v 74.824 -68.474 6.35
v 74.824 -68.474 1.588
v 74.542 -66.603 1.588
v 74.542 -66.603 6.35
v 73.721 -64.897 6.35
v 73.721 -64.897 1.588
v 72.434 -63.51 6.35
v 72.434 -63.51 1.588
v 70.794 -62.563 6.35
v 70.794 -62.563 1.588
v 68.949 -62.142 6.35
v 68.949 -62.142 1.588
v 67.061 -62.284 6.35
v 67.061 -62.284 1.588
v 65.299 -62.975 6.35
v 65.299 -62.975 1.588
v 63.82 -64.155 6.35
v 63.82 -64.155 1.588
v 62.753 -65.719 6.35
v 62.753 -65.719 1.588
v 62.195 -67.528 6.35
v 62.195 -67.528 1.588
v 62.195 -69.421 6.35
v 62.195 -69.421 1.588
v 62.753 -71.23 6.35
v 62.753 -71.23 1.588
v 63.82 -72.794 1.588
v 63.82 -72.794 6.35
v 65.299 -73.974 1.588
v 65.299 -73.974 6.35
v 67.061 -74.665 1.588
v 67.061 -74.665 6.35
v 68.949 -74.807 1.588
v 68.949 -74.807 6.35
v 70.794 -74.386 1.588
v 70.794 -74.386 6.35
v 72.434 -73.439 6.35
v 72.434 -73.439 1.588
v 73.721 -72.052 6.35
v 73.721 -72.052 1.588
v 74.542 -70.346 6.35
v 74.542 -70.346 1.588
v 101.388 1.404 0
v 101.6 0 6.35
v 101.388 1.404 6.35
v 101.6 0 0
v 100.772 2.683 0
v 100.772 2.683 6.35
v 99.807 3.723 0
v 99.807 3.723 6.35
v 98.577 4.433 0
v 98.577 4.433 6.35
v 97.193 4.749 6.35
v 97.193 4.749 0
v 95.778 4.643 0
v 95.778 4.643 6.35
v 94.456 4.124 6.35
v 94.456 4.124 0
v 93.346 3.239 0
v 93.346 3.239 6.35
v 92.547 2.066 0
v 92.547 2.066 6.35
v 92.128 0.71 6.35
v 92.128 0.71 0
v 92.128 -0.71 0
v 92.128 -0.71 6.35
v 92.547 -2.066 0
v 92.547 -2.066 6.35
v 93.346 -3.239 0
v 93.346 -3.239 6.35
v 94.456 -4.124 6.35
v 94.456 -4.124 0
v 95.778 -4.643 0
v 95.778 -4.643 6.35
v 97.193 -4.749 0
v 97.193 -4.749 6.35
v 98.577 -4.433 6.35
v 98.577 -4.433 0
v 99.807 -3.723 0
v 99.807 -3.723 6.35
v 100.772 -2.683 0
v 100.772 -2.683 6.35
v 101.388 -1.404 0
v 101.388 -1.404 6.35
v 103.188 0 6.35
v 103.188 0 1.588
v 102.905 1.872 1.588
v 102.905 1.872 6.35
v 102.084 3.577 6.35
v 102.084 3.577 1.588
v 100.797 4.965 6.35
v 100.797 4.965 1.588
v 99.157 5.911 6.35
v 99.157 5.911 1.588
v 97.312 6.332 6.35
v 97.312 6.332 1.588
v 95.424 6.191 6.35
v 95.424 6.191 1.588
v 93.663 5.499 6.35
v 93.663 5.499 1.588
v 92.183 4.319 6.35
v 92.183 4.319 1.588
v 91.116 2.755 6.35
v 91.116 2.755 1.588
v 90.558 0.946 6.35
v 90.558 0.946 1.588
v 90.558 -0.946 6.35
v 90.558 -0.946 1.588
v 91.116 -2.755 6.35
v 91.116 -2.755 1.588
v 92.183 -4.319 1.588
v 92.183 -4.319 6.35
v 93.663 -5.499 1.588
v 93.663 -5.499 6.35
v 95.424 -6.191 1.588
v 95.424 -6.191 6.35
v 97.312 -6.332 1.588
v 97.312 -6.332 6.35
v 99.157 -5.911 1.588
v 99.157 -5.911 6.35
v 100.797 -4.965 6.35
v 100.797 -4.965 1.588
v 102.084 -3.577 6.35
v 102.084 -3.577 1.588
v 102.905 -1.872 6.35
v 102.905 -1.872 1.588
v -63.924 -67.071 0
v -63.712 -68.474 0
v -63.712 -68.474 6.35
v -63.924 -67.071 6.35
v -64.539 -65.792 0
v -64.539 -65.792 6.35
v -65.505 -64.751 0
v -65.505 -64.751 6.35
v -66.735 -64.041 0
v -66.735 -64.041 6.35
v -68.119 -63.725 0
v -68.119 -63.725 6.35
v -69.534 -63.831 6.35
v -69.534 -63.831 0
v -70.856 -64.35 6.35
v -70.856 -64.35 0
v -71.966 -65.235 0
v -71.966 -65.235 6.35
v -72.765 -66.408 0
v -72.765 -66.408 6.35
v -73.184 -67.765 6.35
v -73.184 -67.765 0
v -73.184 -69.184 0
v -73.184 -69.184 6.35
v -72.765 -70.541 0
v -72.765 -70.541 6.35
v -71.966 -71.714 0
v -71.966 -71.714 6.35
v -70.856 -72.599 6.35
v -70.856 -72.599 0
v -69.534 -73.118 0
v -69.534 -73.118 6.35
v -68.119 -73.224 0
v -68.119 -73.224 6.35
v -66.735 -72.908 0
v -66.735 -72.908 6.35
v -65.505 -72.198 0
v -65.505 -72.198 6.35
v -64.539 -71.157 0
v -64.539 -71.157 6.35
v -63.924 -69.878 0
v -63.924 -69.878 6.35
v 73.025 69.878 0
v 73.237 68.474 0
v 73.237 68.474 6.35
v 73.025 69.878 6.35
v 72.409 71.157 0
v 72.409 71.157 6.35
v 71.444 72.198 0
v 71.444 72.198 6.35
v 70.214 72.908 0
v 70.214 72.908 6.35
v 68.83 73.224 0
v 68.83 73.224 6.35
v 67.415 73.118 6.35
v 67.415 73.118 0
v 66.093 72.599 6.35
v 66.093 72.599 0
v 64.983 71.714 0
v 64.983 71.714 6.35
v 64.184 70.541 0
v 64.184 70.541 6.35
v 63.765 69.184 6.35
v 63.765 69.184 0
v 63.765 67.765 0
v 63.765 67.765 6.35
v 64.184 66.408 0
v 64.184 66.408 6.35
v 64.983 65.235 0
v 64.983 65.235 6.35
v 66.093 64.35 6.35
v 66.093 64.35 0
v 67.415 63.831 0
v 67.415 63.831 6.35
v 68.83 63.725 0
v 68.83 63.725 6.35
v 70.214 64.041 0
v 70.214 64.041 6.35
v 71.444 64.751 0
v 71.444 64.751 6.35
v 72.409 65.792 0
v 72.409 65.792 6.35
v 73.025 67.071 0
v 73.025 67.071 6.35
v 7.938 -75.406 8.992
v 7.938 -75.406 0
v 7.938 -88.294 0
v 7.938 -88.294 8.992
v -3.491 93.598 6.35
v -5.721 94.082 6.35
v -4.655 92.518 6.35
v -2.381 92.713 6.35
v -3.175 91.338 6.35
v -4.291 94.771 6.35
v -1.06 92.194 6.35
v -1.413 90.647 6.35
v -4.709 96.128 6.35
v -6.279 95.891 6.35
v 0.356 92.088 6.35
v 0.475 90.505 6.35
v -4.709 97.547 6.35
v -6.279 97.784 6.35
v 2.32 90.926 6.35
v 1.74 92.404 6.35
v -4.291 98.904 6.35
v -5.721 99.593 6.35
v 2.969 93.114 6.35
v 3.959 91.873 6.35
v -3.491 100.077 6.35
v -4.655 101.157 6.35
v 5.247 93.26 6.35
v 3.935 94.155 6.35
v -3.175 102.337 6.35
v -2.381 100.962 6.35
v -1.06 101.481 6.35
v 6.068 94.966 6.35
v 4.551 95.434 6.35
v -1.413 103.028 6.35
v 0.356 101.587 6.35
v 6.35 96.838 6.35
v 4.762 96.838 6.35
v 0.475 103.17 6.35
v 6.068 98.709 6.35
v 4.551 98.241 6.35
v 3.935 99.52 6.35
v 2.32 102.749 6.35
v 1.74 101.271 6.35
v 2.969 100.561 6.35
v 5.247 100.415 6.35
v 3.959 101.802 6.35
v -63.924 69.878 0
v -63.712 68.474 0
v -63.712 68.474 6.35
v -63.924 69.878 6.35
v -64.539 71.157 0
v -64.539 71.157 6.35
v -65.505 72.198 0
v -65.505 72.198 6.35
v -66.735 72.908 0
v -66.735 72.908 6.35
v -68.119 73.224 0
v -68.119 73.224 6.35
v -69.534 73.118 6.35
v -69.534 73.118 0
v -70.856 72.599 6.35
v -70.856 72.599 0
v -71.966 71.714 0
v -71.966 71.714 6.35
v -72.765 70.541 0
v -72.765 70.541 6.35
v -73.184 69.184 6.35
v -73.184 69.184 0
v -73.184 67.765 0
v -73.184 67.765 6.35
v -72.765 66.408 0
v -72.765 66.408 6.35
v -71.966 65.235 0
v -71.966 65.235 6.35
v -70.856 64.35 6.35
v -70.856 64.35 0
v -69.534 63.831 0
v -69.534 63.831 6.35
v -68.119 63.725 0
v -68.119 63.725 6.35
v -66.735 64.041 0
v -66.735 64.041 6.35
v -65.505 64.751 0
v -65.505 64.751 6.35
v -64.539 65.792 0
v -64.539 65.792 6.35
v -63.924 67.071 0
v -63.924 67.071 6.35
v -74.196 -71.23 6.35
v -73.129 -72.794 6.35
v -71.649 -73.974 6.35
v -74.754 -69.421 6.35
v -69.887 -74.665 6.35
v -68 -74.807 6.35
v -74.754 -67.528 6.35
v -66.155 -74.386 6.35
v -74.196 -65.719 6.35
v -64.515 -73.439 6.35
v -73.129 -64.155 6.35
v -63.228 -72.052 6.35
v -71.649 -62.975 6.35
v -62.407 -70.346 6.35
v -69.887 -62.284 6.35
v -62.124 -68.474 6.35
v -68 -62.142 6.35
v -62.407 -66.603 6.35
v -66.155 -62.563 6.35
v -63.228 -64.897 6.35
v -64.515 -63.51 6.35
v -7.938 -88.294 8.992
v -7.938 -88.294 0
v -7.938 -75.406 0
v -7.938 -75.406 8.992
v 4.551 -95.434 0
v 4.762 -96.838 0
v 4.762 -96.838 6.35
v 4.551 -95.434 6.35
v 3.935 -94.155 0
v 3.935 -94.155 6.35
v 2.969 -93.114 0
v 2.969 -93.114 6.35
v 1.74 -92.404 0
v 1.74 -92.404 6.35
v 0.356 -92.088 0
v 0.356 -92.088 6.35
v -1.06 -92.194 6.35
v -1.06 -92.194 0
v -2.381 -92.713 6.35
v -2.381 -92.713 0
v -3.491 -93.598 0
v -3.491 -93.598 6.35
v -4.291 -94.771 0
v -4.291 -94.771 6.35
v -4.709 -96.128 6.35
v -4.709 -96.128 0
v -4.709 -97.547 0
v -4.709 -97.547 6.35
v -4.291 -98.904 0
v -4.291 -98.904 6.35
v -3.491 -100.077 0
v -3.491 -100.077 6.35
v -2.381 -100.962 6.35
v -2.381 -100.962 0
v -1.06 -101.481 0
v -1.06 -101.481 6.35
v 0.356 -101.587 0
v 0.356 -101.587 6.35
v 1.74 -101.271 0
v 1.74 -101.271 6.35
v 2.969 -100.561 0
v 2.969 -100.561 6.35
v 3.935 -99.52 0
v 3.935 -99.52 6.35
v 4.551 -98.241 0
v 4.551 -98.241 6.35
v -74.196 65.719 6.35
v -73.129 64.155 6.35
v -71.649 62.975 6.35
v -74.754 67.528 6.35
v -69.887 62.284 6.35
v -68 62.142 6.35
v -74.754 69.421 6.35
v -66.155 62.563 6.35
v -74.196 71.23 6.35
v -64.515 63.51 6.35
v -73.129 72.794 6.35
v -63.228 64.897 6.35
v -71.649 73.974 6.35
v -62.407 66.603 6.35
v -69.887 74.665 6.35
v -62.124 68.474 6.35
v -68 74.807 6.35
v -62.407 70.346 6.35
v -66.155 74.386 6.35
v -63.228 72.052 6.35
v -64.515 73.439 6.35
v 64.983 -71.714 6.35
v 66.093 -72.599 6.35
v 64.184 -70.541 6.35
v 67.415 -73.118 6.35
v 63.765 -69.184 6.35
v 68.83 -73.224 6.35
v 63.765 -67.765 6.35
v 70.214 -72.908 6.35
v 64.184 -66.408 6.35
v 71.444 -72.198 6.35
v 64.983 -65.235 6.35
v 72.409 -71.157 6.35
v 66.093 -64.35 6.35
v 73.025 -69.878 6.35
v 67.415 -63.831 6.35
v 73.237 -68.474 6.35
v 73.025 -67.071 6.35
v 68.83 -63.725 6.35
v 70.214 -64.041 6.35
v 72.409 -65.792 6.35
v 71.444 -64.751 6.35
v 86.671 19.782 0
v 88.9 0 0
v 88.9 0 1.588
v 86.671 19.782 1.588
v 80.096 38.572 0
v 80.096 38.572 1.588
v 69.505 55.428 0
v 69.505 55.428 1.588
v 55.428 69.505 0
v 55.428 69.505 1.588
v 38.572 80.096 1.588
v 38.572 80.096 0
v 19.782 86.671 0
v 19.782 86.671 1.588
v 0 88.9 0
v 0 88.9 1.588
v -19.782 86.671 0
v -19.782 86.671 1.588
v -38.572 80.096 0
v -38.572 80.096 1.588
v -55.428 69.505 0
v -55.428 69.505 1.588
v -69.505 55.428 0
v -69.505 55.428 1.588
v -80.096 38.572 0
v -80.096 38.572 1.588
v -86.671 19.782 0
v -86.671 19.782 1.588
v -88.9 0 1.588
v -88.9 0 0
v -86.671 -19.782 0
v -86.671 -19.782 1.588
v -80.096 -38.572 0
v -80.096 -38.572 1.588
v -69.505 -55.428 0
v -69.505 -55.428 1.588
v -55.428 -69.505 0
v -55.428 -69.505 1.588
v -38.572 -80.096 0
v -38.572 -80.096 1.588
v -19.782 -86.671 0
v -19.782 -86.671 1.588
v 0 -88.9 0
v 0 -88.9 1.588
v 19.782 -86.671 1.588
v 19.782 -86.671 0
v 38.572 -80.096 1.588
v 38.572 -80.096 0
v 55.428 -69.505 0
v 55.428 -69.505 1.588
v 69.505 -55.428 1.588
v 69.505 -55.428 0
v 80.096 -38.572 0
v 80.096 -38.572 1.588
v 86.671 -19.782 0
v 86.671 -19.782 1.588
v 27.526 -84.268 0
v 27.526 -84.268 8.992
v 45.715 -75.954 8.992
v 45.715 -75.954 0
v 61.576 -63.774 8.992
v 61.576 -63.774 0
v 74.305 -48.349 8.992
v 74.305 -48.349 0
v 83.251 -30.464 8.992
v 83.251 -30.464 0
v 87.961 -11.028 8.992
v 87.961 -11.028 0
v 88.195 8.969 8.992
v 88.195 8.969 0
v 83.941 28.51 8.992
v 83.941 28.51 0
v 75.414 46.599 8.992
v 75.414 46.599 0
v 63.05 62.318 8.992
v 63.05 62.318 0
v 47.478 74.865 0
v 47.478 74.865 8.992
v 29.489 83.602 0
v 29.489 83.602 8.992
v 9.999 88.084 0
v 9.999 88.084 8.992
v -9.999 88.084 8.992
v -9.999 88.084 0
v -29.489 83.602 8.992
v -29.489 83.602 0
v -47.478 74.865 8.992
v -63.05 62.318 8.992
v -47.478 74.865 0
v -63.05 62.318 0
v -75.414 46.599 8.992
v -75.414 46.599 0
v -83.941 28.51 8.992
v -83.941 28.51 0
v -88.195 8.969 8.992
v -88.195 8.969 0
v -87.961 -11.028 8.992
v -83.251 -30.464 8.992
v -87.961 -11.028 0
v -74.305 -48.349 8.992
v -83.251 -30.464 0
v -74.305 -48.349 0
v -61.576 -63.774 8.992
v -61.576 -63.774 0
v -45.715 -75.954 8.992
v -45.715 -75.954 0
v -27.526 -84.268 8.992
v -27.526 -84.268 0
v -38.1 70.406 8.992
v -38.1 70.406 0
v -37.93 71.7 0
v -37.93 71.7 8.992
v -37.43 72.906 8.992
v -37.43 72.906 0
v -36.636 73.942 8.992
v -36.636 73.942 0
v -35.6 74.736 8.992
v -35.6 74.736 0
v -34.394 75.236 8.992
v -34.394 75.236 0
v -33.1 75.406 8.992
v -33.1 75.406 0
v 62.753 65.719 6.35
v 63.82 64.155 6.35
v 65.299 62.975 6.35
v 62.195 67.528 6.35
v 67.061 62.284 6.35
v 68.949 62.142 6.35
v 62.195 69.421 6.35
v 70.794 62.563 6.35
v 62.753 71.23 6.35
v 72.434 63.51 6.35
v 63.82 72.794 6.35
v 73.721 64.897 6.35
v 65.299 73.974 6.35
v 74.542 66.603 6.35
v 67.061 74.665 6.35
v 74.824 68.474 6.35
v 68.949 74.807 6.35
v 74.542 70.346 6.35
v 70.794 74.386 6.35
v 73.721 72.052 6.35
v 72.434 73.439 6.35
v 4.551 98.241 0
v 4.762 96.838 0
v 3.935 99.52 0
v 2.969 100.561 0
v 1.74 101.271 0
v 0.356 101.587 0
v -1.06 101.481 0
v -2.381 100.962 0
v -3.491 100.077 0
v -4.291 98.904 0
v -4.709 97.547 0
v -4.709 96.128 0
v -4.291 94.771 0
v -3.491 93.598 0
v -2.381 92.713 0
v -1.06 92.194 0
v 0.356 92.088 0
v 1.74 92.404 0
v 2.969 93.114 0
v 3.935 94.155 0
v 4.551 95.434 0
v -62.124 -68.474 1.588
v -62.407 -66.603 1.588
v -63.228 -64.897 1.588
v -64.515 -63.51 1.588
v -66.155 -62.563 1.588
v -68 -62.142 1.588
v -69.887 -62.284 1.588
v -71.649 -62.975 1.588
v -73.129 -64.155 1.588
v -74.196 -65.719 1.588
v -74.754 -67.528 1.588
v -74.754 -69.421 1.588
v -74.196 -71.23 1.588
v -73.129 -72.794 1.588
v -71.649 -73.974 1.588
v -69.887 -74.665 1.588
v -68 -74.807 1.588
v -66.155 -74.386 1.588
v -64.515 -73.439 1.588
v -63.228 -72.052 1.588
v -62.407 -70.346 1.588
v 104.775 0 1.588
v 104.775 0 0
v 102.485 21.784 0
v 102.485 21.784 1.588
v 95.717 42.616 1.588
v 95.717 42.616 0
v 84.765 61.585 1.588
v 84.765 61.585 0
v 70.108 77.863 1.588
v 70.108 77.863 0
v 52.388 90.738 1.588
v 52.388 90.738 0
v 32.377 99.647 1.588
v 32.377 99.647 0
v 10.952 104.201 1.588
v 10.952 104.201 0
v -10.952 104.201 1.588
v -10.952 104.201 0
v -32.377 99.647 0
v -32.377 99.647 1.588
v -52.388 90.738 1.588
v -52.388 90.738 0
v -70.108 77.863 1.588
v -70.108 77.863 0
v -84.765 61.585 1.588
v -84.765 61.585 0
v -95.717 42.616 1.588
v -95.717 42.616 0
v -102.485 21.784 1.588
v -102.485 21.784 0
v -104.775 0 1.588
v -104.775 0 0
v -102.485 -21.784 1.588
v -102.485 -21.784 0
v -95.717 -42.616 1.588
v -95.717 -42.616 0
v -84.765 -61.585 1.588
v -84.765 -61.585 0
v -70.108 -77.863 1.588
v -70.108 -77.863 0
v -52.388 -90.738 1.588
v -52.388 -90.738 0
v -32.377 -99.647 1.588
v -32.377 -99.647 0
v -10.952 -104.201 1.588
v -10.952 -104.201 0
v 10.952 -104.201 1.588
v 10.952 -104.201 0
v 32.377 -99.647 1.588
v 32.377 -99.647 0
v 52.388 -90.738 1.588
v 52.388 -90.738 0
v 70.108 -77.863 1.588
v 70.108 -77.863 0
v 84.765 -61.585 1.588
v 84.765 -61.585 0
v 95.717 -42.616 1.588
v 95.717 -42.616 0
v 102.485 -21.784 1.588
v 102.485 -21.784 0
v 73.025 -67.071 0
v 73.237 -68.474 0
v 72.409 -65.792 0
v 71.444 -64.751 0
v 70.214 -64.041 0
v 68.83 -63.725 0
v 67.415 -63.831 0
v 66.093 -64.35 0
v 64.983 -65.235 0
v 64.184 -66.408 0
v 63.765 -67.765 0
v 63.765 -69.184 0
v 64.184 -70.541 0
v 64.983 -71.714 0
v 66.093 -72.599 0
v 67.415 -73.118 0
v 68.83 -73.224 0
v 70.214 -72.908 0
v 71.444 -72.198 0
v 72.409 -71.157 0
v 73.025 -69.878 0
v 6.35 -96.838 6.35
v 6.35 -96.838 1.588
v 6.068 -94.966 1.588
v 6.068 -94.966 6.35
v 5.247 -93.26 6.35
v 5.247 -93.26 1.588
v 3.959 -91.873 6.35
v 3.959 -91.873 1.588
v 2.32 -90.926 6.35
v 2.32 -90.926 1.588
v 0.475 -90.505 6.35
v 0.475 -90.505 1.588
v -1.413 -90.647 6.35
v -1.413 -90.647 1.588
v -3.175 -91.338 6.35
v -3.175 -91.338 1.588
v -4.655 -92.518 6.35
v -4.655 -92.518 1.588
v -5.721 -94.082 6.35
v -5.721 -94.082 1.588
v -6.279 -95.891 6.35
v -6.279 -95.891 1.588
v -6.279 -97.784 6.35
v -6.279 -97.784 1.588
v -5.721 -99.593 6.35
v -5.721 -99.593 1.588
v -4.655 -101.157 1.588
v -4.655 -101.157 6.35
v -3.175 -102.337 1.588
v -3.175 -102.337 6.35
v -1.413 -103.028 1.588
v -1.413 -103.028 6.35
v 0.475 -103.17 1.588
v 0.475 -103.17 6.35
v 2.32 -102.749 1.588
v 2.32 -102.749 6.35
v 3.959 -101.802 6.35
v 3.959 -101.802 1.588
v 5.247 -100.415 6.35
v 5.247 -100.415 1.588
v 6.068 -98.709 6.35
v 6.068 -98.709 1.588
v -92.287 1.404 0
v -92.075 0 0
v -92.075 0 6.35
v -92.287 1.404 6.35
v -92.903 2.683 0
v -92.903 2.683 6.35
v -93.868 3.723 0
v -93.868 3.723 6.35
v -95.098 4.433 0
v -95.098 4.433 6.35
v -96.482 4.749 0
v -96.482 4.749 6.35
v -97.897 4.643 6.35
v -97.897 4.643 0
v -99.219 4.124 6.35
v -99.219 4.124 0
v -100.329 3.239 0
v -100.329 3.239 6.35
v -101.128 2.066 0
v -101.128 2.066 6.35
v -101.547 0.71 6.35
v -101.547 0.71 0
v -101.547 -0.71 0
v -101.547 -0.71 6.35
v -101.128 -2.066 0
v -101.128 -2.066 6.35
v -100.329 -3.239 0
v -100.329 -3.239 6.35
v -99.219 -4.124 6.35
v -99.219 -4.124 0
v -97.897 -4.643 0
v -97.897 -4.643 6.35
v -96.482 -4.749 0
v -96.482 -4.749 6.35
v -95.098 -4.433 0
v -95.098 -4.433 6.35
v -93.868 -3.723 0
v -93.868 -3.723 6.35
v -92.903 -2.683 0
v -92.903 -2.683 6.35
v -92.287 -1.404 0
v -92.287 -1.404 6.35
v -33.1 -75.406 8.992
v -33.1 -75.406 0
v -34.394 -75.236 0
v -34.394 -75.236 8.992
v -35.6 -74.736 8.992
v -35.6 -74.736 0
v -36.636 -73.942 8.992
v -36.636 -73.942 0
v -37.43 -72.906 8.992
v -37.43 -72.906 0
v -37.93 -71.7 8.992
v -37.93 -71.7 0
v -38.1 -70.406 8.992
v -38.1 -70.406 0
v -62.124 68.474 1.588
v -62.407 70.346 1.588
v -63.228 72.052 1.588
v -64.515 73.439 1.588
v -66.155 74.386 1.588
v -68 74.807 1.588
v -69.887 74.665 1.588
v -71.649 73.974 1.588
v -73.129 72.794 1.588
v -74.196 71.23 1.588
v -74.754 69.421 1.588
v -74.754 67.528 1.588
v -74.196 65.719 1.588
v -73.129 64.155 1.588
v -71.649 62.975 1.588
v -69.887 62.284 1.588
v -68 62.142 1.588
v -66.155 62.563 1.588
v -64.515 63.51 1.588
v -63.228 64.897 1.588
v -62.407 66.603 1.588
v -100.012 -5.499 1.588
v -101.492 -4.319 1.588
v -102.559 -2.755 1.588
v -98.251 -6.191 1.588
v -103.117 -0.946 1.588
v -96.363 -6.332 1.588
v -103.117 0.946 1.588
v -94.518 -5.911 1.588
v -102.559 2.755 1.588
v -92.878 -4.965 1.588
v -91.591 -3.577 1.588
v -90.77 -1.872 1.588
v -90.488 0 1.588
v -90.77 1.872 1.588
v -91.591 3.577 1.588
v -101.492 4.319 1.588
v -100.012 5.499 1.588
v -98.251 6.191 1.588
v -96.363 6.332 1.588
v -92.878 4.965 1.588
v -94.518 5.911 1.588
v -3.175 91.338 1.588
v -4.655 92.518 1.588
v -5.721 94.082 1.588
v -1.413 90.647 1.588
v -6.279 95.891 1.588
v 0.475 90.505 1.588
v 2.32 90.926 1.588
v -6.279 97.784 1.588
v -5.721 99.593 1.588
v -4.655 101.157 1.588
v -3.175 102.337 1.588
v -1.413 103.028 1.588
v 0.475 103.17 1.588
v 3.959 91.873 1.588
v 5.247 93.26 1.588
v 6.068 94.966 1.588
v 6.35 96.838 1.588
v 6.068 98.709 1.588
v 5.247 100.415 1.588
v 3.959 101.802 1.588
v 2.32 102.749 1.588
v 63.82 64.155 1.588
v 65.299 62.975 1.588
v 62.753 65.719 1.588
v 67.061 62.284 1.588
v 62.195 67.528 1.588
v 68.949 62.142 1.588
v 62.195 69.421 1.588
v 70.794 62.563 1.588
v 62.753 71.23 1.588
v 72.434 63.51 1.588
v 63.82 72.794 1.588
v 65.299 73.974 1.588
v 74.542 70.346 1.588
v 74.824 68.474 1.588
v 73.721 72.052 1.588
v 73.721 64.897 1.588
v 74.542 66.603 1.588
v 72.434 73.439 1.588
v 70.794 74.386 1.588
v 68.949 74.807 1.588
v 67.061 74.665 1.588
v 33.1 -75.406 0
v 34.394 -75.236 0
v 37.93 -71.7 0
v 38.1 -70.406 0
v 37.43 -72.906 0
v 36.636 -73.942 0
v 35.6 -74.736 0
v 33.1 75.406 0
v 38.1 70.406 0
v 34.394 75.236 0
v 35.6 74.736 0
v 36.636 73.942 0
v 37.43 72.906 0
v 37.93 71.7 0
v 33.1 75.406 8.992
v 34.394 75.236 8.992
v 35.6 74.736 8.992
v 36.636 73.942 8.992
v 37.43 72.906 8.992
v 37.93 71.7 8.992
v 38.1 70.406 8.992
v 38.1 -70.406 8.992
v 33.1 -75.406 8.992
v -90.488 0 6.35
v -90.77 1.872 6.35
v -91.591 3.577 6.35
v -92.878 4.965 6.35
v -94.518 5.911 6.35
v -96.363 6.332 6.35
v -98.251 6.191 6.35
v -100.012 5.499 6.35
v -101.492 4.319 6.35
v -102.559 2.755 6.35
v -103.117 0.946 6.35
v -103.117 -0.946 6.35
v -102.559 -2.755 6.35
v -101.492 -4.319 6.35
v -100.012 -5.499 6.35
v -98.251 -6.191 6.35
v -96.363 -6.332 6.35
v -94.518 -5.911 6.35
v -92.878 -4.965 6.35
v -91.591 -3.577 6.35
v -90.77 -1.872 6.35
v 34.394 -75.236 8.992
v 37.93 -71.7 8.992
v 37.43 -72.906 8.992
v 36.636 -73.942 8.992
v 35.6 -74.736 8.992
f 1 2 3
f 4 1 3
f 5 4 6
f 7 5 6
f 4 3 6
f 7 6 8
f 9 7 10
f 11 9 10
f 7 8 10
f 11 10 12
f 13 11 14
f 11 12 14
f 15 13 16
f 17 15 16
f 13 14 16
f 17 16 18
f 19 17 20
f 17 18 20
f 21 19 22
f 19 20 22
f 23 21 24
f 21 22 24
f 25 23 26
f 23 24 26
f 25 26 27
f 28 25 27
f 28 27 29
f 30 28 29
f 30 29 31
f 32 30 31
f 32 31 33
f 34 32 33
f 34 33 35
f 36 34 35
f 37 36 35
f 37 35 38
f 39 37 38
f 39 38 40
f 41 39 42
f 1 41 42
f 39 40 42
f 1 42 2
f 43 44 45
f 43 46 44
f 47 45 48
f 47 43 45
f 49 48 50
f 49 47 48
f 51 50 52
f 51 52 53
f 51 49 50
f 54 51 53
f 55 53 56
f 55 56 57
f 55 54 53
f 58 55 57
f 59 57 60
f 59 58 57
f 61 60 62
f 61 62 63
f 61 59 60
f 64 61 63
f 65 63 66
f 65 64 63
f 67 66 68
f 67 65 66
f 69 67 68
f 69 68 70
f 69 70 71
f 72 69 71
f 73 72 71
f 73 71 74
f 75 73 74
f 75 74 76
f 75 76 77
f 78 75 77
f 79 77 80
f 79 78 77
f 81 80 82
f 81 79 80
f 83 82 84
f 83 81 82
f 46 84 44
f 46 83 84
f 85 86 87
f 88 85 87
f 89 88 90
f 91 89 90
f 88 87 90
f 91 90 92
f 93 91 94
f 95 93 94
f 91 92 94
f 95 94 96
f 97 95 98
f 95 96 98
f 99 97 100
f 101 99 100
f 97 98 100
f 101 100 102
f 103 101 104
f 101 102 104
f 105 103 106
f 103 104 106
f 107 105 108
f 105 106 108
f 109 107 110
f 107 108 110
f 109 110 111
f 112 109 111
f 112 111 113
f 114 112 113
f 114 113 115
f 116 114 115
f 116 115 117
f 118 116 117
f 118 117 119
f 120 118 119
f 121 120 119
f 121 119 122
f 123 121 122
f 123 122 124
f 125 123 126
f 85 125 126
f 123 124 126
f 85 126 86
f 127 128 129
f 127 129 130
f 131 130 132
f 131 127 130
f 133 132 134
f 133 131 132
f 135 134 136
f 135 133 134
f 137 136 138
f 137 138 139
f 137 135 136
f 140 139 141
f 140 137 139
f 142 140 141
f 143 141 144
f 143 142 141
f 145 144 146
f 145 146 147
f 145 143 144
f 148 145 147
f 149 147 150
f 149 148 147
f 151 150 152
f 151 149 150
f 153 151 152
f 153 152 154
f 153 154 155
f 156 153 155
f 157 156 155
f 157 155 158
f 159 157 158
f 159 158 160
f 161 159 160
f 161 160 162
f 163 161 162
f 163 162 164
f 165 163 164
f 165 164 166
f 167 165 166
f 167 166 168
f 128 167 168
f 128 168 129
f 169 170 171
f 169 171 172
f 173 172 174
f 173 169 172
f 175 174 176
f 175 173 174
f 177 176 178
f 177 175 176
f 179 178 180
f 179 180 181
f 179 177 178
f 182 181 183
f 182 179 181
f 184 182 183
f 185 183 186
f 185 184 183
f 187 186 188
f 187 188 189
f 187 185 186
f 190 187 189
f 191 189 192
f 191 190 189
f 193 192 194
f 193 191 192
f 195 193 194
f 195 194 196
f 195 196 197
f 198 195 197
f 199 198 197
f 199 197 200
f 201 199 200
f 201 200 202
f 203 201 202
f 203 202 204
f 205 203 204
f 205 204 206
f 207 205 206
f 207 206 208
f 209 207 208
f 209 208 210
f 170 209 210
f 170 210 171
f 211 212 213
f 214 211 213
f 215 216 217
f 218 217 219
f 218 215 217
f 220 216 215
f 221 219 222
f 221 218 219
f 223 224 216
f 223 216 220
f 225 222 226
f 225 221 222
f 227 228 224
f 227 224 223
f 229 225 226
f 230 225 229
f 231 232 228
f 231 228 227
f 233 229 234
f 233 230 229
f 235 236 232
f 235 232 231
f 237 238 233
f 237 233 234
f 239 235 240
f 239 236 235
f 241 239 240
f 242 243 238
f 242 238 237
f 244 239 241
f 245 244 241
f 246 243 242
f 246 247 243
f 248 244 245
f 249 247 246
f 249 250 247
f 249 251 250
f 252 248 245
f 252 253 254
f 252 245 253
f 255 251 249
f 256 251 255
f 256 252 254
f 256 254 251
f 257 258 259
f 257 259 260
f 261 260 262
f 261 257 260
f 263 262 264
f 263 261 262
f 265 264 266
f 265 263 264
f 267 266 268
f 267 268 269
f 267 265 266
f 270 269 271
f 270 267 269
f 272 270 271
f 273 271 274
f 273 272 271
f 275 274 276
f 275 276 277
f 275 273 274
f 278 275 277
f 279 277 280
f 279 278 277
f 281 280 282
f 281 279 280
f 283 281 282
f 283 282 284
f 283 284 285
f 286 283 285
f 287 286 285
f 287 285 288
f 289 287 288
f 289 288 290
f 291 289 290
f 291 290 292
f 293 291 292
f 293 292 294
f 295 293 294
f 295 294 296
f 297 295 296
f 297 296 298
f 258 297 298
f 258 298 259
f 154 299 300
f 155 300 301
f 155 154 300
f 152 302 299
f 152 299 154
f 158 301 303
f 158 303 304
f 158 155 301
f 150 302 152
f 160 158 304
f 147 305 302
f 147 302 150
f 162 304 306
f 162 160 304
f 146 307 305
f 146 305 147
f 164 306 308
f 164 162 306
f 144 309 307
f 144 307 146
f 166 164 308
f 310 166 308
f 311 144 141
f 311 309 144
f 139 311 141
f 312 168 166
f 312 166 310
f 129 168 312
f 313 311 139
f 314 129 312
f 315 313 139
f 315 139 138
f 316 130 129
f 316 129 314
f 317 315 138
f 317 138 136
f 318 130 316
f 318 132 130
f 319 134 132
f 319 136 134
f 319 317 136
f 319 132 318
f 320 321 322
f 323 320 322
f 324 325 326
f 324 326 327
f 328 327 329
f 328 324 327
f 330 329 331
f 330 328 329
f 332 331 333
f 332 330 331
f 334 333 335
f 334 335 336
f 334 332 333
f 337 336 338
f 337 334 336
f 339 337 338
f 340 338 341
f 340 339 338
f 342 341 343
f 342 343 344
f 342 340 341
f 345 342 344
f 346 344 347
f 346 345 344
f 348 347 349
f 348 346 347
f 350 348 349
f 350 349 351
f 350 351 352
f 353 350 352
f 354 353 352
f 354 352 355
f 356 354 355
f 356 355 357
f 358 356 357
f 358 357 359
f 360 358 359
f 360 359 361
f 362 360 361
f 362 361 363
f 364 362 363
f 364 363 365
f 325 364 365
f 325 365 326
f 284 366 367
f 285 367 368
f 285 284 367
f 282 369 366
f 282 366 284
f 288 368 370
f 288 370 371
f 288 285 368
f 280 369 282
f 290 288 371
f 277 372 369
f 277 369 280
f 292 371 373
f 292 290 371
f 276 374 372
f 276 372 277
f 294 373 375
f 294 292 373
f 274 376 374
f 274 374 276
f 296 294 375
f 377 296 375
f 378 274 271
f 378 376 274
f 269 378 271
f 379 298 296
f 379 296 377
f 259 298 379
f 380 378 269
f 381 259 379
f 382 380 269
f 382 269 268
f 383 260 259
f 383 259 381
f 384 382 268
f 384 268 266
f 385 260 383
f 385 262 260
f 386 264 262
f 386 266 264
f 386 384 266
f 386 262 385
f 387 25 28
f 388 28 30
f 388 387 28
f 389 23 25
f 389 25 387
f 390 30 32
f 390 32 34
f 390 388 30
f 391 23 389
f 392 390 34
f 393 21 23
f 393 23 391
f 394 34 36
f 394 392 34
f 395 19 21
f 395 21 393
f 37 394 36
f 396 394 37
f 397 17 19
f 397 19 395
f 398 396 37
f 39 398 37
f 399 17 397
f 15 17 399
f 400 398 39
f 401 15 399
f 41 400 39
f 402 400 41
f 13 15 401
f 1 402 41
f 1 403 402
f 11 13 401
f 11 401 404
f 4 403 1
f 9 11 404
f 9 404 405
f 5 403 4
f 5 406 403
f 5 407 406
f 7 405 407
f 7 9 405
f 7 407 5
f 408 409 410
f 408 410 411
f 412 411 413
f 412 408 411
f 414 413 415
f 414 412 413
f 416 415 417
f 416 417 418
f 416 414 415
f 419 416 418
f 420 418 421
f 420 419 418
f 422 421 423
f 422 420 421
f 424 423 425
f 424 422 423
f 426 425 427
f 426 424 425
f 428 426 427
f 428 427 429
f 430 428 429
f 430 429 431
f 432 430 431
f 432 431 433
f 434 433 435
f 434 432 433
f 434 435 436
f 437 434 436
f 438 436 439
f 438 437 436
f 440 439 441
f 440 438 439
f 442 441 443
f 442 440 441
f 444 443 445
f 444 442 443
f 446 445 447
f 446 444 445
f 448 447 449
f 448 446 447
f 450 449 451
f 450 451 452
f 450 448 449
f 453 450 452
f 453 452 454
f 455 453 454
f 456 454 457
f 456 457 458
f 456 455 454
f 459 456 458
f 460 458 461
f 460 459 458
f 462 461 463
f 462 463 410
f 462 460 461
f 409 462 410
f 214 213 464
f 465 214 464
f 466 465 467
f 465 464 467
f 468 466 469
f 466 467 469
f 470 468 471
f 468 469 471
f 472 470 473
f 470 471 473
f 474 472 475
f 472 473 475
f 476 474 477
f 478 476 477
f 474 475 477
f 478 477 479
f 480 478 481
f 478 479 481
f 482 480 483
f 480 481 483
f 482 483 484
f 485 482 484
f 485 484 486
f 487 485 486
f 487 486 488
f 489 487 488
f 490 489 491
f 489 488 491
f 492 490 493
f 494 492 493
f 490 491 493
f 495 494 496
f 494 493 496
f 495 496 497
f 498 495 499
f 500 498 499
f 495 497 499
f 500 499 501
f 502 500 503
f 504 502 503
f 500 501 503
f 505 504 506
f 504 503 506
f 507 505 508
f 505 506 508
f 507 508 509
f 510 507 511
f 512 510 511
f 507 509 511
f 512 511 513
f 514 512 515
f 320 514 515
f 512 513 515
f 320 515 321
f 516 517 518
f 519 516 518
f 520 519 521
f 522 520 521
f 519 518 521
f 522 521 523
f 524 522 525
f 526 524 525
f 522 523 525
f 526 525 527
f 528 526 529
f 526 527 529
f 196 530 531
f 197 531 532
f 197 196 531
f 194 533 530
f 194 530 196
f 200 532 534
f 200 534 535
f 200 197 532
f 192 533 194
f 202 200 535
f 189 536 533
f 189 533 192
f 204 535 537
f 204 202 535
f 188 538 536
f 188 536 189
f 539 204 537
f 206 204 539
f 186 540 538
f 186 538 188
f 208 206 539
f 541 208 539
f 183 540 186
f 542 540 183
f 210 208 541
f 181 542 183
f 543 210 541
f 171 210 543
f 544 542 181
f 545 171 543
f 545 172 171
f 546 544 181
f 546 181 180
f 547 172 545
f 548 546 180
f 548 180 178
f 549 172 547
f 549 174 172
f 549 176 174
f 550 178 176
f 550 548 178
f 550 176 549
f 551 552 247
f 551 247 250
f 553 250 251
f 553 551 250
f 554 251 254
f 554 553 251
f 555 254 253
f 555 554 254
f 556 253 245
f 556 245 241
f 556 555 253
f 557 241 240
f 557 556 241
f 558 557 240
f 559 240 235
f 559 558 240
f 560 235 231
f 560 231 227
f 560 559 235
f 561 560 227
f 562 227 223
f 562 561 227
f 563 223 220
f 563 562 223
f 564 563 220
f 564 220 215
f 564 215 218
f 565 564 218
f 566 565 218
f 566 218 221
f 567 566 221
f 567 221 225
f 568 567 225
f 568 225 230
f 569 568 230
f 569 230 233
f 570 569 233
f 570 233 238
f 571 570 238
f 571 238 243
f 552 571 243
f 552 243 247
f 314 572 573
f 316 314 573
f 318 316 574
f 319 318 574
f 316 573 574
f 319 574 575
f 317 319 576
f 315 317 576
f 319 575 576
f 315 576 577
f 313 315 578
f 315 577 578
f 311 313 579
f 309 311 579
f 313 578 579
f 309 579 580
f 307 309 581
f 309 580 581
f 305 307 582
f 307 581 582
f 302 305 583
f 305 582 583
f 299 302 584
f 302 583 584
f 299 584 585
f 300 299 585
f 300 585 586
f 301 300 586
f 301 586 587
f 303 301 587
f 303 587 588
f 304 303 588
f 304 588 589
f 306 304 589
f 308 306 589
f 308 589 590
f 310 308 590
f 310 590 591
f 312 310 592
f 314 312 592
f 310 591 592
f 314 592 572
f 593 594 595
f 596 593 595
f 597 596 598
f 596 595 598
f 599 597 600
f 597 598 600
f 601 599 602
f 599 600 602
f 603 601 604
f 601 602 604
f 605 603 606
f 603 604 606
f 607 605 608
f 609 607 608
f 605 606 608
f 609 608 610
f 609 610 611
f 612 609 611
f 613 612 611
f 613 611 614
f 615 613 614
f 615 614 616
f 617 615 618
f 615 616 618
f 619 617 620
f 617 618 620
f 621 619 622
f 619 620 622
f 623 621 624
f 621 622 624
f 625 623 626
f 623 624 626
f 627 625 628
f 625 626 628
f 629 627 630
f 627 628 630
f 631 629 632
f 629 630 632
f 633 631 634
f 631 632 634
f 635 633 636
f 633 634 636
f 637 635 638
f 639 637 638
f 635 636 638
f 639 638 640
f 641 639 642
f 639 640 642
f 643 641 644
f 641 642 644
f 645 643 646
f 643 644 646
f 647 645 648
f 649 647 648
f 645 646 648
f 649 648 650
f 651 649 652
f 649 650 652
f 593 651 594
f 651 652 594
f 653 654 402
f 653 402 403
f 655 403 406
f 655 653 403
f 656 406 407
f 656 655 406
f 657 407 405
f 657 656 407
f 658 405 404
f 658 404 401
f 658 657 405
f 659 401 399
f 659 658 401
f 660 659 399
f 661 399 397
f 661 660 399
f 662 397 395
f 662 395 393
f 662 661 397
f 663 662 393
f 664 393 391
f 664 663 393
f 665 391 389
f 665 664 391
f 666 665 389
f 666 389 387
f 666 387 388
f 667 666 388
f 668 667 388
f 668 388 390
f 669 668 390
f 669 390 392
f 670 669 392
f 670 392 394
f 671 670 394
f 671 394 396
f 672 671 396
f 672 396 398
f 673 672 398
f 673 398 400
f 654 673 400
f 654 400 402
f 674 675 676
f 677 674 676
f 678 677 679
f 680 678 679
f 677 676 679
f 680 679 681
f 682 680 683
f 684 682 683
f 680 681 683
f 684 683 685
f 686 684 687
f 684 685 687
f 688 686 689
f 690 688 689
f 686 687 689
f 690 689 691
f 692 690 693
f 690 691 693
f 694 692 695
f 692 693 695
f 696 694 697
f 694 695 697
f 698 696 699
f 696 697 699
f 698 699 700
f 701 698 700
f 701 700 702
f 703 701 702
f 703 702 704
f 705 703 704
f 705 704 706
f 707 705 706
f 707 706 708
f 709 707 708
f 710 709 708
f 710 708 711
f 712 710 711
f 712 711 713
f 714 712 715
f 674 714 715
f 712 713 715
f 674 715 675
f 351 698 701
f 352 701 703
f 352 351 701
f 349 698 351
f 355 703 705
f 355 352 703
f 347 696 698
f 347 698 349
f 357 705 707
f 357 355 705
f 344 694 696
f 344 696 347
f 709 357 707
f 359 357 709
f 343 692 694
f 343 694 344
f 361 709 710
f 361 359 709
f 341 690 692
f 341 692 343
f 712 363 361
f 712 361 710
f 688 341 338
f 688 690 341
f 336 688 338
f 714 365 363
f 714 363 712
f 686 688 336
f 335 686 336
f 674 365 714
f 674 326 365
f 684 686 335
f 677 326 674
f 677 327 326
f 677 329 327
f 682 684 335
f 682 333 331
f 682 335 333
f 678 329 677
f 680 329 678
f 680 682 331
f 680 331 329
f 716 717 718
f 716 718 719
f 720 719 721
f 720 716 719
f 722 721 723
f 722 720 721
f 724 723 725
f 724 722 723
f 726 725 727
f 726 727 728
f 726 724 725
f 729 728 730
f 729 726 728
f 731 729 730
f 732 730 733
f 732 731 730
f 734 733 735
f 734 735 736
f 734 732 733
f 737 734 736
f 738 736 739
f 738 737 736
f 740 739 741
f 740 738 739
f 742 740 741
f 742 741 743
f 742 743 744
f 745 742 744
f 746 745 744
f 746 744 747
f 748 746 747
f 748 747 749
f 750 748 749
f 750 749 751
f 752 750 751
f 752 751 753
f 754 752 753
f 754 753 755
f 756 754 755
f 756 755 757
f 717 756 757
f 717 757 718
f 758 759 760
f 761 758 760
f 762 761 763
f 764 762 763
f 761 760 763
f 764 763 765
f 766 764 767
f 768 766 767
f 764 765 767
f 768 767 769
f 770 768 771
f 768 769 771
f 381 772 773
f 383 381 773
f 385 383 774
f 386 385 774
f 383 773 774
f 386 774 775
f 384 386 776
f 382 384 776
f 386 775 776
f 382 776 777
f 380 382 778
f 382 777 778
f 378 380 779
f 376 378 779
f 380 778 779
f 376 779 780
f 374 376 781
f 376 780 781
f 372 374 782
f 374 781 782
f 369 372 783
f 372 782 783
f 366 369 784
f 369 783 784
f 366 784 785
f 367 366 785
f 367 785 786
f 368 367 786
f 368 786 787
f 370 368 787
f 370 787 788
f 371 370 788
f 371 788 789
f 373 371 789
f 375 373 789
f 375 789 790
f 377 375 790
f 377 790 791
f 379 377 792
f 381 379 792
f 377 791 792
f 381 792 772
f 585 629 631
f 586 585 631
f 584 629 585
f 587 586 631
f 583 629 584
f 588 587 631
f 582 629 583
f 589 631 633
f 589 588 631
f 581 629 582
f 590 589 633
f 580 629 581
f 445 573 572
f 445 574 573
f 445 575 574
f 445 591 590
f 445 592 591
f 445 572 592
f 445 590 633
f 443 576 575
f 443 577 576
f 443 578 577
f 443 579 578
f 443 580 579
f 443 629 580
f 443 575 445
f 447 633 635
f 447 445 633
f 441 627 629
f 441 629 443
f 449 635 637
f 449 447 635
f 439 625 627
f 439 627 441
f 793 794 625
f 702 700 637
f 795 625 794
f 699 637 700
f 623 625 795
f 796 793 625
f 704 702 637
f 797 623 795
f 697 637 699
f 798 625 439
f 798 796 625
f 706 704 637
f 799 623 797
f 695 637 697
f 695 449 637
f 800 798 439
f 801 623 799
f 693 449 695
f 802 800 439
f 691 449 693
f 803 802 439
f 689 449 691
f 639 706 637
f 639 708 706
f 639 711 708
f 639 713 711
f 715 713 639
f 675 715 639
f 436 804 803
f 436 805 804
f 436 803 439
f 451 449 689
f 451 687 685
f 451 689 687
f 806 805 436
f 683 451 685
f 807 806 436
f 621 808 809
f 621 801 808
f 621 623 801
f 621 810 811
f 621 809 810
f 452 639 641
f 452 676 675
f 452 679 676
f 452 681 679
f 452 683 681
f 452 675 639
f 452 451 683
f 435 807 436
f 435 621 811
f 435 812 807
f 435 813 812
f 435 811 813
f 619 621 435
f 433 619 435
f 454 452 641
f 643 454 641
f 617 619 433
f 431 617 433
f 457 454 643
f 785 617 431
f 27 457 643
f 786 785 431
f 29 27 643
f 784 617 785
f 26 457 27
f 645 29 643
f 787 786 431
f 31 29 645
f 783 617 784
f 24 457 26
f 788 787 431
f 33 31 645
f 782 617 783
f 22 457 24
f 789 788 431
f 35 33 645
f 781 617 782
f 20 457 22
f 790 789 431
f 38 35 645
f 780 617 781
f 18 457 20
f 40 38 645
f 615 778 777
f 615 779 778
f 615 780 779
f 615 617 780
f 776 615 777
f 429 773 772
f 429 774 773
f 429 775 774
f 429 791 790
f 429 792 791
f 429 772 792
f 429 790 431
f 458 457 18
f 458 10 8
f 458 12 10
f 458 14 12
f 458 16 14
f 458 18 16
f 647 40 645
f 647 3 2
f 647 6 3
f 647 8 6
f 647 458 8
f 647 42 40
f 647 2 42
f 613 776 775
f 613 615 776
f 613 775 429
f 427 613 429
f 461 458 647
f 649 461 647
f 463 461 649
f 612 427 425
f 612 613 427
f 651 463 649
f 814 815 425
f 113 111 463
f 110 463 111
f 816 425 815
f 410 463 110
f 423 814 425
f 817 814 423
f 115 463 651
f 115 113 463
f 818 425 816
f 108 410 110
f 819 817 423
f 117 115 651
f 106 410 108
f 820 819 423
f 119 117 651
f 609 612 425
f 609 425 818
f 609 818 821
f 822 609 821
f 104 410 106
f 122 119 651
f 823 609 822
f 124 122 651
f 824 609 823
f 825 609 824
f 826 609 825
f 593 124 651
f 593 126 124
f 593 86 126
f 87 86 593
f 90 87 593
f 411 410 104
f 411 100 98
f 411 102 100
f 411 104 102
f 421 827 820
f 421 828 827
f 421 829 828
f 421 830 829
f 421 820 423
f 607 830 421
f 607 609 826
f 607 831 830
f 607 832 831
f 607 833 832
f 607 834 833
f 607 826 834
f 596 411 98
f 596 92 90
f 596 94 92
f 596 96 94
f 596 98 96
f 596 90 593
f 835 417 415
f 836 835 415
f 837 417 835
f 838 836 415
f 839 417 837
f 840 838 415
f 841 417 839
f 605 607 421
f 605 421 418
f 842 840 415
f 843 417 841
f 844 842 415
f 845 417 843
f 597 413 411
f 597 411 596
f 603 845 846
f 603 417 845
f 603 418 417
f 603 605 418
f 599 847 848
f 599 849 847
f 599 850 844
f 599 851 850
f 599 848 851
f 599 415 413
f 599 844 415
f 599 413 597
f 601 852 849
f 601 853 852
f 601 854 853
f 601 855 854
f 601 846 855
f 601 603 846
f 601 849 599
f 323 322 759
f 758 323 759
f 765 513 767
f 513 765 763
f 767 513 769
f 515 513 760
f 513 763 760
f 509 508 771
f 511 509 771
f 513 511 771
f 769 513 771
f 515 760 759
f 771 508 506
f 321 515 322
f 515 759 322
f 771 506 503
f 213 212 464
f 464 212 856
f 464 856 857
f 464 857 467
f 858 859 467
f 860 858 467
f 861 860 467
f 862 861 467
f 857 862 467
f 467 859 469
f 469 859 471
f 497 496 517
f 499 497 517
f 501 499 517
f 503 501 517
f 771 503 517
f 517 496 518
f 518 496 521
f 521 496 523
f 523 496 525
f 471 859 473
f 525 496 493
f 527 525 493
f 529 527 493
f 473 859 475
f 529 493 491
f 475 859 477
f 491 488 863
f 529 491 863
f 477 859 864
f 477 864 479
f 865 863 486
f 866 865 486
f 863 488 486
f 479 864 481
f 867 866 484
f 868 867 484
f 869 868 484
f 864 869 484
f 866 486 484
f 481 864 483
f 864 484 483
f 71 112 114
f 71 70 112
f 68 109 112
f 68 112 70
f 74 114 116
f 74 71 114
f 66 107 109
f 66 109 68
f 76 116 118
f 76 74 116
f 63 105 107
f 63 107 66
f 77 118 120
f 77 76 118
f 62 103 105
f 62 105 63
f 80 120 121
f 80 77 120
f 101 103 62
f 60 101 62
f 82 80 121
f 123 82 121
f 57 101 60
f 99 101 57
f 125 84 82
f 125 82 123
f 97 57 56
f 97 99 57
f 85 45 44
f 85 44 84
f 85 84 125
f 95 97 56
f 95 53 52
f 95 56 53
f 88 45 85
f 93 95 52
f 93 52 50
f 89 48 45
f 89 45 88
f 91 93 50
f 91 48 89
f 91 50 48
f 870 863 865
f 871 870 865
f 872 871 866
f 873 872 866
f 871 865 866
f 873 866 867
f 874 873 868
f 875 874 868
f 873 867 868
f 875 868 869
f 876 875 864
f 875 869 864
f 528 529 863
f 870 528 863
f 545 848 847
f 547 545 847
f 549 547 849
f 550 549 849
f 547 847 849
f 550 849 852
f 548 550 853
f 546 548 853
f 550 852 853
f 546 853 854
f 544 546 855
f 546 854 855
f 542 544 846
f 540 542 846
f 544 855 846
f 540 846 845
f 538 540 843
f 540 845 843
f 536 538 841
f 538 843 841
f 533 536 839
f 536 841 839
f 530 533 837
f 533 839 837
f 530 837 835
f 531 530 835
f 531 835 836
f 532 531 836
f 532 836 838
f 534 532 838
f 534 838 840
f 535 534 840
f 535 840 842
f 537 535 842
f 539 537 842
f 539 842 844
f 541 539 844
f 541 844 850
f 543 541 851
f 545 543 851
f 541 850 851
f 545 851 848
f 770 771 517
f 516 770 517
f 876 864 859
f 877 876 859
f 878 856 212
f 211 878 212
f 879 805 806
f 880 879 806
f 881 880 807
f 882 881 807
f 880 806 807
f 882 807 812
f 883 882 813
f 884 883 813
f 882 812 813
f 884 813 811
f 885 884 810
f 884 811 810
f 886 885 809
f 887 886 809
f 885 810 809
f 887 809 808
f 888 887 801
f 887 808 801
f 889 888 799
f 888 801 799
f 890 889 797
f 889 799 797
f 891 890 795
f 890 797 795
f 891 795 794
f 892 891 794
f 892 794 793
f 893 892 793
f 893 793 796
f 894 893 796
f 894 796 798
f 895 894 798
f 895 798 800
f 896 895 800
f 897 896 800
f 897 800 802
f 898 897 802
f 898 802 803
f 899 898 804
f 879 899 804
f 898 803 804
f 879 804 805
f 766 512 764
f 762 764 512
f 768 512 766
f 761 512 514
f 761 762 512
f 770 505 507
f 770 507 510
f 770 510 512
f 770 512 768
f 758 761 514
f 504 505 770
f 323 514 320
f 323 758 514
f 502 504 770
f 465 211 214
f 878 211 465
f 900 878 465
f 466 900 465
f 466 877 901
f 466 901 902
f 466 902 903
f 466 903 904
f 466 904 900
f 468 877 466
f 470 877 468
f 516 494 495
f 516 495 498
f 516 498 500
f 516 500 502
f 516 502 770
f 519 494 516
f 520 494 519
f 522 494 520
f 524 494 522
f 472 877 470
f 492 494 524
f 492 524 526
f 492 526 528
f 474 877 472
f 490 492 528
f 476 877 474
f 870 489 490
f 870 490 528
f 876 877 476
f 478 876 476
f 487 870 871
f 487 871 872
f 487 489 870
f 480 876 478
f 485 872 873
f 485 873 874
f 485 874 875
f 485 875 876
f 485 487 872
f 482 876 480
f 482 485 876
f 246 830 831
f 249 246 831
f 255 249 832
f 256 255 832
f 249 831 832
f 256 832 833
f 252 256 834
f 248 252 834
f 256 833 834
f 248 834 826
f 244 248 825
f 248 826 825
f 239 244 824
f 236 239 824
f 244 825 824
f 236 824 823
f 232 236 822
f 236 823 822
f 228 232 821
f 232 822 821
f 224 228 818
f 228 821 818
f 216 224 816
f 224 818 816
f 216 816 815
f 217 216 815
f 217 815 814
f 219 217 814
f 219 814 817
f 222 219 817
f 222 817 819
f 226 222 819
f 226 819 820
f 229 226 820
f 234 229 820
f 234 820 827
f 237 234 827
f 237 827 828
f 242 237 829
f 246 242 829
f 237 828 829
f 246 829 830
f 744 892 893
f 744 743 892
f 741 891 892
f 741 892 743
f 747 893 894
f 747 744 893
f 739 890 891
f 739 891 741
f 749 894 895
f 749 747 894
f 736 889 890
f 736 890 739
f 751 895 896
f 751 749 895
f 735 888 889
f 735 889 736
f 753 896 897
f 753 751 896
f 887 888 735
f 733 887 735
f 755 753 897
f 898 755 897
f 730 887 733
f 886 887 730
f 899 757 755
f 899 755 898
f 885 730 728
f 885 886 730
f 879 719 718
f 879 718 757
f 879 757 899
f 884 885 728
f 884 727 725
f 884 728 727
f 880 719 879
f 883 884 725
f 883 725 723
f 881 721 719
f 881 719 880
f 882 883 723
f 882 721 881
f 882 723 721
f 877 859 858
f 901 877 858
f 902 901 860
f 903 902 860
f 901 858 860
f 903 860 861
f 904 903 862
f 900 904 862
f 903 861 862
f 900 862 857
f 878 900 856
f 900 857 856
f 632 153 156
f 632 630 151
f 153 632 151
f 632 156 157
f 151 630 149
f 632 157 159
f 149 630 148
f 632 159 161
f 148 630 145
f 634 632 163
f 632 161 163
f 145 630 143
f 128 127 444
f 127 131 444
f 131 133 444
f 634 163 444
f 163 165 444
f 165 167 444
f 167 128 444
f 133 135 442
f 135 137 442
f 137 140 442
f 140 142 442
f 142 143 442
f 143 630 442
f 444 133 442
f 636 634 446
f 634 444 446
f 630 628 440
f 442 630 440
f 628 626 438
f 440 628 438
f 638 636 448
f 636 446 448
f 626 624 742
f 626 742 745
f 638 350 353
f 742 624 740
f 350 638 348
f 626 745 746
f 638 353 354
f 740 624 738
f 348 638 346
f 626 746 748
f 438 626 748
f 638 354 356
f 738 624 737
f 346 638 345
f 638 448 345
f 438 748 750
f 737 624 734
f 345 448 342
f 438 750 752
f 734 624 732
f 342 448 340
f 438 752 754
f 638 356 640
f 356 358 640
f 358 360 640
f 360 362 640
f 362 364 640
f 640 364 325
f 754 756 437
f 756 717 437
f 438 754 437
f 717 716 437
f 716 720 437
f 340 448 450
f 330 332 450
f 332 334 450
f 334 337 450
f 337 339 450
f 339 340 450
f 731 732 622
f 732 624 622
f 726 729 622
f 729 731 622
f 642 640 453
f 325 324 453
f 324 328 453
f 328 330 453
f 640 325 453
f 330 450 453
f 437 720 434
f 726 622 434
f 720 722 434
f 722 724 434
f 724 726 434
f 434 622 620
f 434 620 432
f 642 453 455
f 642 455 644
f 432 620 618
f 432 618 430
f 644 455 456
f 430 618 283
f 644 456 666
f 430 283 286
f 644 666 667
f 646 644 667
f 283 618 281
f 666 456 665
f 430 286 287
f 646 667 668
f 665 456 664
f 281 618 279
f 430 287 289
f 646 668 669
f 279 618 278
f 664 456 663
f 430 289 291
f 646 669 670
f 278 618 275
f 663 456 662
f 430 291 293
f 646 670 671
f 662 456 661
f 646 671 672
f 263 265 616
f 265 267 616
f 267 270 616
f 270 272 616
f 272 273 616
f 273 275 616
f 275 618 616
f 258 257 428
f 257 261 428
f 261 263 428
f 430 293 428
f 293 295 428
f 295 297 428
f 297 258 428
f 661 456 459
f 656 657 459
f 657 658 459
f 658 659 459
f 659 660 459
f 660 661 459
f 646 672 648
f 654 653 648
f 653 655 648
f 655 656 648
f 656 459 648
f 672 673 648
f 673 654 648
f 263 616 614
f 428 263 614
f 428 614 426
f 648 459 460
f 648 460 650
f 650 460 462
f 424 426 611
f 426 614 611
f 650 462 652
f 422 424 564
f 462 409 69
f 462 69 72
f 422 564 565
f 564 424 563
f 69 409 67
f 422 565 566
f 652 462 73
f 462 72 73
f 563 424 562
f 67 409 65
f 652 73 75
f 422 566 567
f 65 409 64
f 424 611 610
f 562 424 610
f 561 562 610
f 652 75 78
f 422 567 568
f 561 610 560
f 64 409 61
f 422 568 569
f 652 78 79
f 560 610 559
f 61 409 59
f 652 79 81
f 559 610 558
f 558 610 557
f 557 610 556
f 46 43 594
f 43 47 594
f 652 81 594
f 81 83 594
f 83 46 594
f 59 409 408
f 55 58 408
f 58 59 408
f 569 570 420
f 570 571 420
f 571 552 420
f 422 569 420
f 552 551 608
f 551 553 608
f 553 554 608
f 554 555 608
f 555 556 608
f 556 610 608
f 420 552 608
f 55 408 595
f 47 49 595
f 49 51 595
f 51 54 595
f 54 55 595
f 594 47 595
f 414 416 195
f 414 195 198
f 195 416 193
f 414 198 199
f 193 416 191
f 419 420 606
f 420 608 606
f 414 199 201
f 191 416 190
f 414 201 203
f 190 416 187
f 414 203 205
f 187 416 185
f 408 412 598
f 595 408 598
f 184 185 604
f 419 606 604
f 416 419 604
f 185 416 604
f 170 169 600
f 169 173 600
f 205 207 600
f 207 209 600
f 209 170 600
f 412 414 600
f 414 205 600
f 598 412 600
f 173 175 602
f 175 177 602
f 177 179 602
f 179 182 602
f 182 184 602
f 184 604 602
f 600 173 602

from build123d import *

# Parameters (mm, degrees)
F1_DEPTH = 8.9916
F2_R     = 104.775
F2_R_2   = 4.7625
F2_R_3   = 88.9
F3_DEPTH = 1.5875
F4_R     = 6.35
F4_R_2   = 4.7625
F5_DEPTH = 4.7625


# Not quite as in the source:
# - a feature of the source that left no trace in its solid (it failed there, or was rolled back) is left out
# - the program builds the solid bodies; features that only make, move or delete a surface that nothing else refers to are left out


with BuildPart() as f1:
    # F0 (on Top) → F1 (new body)
    with BuildSketch(Plane.XY):
        with BuildLine():
            ThreePointArc((7.9375, -88.2939329385), (65.4311923894, -59.8128879298), (88.65, 0))
            ThreePointArc((88.65, 0), (-59.8128879298, 65.4311923894), (-7.9375, -88.2939329385))
            Line((-7.9375, -88.2939329385), (-7.9375, -75.40625))
            Line((-7.9375, -75.40625), (-33.1, -75.40625))
            ThreePointArc((-33.1, -75.40625), (-36.6355339059, -73.9417839059), (-38.1, -70.40625))
            Line((-38.1, -70.40625), (-38.1, 70.40625))
            ThreePointArc((-38.1, 70.40625), (-36.6355339059, 73.9417839059), (-33.1, 75.40625))
            Line((-33.1, 75.40625), (33.1, 75.40625))
            ThreePointArc((33.1, 75.40625), (36.6355339059, 73.9417839059), (38.1, 70.40625))
            Line((38.1, 70.40625), (38.1, -70.40625))
            ThreePointArc((38.1, -70.40625), (36.6355339059, -73.9417839059), (33.1, -75.40625))
            Line((33.1, -75.40625), (7.9375, -75.40625))
            Line((7.9375, -75.40625), (7.9375, -88.2939329385))
        make_face()
    extrude(amount=F1_DEPTH)


with BuildPart() as f3:
    # F2 (on Top) → F3 (new body)
    with BuildSketch(Plane.XY):
        Circle(F2_R)
        with Locations((-68.4744529232, -68.4744529232)):
            Circle(F2_R_2, mode=Mode.SUBTRACT)
        with Locations((0, -96.8375)):
            Circle(F2_R_2, mode=Mode.SUBTRACT)
        with Locations((68.4744529232, -68.4744529232)):
            Circle(F2_R_2, mode=Mode.SUBTRACT)
        with Locations((-96.8375, 0)):
            Circle(F2_R_2, mode=Mode.SUBTRACT)
        with Locations((-68.4744529232, 68.4744529232)):
            Circle(F2_R_2, mode=Mode.SUBTRACT)
        Circle(F2_R_3, mode=Mode.SUBTRACT)
        with Locations((96.8375, 0)):
            Circle(F2_R_2, mode=Mode.SUBTRACT)
        with Locations((0, 96.8375)):
            Circle(F2_R_2, mode=Mode.SUBTRACT)
        with Locations((68.4744529232, 68.4744529232)):
            Circle(F2_R_2, mode=Mode.SUBTRACT)
    extrude(amount=F3_DEPTH)

    # F4 (on face) → F5 (join)
    with BuildSketch(Plane.XY.offset(1.5875)):
        with Locations((96.8375, 0)):
            Circle(F4_R)
        with Locations((96.8375, 0)):
            Circle(F4_R_2, mode=Mode.SUBTRACT)
        with Locations((68.4744529232, 68.4744529232)):
            Circle(F4_R)
        with Locations((68.4744529232, 68.4744529232)):
            Circle(F4_R_2, mode=Mode.SUBTRACT)
        with Locations((0, 96.8375)):
            Circle(F4_R)
        with Locations((0, 96.8375)):
            Circle(F4_R_2, mode=Mode.SUBTRACT)
        with Locations((-68.4744529232, 68.4744529232)):
            Circle(F4_R)
        with Locations((-68.4744529232, 68.4744529232)):
            Circle(F4_R_2, mode=Mode.SUBTRACT)
        with Locations((-96.8375, 0)):
            Circle(F4_R)
        with Locations((-96.8375, 0)):
            Circle(F4_R_2, mode=Mode.SUBTRACT)
        with Locations((-68.4744529232, -68.4744529232)):
            Circle(F4_R)
        with Locations((-68.4744529232, -68.4744529232)):
            Circle(F4_R_2, mode=Mode.SUBTRACT)
        with Locations((0, -96.8375)):
            Circle(F4_R)
        with Locations((0, -96.8375)):
            Circle(F4_R_2, mode=Mode.SUBTRACT)
        with Locations((68.4744529232, -68.4744529232)):
            Circle(F4_R)
        with Locations((68.4744529232, -68.4744529232)):
            Circle(F4_R_2, mode=Mode.SUBTRACT)
    extrude(amount=F5_DEPTH)


solid = Compound([f1.part, f3.part])
